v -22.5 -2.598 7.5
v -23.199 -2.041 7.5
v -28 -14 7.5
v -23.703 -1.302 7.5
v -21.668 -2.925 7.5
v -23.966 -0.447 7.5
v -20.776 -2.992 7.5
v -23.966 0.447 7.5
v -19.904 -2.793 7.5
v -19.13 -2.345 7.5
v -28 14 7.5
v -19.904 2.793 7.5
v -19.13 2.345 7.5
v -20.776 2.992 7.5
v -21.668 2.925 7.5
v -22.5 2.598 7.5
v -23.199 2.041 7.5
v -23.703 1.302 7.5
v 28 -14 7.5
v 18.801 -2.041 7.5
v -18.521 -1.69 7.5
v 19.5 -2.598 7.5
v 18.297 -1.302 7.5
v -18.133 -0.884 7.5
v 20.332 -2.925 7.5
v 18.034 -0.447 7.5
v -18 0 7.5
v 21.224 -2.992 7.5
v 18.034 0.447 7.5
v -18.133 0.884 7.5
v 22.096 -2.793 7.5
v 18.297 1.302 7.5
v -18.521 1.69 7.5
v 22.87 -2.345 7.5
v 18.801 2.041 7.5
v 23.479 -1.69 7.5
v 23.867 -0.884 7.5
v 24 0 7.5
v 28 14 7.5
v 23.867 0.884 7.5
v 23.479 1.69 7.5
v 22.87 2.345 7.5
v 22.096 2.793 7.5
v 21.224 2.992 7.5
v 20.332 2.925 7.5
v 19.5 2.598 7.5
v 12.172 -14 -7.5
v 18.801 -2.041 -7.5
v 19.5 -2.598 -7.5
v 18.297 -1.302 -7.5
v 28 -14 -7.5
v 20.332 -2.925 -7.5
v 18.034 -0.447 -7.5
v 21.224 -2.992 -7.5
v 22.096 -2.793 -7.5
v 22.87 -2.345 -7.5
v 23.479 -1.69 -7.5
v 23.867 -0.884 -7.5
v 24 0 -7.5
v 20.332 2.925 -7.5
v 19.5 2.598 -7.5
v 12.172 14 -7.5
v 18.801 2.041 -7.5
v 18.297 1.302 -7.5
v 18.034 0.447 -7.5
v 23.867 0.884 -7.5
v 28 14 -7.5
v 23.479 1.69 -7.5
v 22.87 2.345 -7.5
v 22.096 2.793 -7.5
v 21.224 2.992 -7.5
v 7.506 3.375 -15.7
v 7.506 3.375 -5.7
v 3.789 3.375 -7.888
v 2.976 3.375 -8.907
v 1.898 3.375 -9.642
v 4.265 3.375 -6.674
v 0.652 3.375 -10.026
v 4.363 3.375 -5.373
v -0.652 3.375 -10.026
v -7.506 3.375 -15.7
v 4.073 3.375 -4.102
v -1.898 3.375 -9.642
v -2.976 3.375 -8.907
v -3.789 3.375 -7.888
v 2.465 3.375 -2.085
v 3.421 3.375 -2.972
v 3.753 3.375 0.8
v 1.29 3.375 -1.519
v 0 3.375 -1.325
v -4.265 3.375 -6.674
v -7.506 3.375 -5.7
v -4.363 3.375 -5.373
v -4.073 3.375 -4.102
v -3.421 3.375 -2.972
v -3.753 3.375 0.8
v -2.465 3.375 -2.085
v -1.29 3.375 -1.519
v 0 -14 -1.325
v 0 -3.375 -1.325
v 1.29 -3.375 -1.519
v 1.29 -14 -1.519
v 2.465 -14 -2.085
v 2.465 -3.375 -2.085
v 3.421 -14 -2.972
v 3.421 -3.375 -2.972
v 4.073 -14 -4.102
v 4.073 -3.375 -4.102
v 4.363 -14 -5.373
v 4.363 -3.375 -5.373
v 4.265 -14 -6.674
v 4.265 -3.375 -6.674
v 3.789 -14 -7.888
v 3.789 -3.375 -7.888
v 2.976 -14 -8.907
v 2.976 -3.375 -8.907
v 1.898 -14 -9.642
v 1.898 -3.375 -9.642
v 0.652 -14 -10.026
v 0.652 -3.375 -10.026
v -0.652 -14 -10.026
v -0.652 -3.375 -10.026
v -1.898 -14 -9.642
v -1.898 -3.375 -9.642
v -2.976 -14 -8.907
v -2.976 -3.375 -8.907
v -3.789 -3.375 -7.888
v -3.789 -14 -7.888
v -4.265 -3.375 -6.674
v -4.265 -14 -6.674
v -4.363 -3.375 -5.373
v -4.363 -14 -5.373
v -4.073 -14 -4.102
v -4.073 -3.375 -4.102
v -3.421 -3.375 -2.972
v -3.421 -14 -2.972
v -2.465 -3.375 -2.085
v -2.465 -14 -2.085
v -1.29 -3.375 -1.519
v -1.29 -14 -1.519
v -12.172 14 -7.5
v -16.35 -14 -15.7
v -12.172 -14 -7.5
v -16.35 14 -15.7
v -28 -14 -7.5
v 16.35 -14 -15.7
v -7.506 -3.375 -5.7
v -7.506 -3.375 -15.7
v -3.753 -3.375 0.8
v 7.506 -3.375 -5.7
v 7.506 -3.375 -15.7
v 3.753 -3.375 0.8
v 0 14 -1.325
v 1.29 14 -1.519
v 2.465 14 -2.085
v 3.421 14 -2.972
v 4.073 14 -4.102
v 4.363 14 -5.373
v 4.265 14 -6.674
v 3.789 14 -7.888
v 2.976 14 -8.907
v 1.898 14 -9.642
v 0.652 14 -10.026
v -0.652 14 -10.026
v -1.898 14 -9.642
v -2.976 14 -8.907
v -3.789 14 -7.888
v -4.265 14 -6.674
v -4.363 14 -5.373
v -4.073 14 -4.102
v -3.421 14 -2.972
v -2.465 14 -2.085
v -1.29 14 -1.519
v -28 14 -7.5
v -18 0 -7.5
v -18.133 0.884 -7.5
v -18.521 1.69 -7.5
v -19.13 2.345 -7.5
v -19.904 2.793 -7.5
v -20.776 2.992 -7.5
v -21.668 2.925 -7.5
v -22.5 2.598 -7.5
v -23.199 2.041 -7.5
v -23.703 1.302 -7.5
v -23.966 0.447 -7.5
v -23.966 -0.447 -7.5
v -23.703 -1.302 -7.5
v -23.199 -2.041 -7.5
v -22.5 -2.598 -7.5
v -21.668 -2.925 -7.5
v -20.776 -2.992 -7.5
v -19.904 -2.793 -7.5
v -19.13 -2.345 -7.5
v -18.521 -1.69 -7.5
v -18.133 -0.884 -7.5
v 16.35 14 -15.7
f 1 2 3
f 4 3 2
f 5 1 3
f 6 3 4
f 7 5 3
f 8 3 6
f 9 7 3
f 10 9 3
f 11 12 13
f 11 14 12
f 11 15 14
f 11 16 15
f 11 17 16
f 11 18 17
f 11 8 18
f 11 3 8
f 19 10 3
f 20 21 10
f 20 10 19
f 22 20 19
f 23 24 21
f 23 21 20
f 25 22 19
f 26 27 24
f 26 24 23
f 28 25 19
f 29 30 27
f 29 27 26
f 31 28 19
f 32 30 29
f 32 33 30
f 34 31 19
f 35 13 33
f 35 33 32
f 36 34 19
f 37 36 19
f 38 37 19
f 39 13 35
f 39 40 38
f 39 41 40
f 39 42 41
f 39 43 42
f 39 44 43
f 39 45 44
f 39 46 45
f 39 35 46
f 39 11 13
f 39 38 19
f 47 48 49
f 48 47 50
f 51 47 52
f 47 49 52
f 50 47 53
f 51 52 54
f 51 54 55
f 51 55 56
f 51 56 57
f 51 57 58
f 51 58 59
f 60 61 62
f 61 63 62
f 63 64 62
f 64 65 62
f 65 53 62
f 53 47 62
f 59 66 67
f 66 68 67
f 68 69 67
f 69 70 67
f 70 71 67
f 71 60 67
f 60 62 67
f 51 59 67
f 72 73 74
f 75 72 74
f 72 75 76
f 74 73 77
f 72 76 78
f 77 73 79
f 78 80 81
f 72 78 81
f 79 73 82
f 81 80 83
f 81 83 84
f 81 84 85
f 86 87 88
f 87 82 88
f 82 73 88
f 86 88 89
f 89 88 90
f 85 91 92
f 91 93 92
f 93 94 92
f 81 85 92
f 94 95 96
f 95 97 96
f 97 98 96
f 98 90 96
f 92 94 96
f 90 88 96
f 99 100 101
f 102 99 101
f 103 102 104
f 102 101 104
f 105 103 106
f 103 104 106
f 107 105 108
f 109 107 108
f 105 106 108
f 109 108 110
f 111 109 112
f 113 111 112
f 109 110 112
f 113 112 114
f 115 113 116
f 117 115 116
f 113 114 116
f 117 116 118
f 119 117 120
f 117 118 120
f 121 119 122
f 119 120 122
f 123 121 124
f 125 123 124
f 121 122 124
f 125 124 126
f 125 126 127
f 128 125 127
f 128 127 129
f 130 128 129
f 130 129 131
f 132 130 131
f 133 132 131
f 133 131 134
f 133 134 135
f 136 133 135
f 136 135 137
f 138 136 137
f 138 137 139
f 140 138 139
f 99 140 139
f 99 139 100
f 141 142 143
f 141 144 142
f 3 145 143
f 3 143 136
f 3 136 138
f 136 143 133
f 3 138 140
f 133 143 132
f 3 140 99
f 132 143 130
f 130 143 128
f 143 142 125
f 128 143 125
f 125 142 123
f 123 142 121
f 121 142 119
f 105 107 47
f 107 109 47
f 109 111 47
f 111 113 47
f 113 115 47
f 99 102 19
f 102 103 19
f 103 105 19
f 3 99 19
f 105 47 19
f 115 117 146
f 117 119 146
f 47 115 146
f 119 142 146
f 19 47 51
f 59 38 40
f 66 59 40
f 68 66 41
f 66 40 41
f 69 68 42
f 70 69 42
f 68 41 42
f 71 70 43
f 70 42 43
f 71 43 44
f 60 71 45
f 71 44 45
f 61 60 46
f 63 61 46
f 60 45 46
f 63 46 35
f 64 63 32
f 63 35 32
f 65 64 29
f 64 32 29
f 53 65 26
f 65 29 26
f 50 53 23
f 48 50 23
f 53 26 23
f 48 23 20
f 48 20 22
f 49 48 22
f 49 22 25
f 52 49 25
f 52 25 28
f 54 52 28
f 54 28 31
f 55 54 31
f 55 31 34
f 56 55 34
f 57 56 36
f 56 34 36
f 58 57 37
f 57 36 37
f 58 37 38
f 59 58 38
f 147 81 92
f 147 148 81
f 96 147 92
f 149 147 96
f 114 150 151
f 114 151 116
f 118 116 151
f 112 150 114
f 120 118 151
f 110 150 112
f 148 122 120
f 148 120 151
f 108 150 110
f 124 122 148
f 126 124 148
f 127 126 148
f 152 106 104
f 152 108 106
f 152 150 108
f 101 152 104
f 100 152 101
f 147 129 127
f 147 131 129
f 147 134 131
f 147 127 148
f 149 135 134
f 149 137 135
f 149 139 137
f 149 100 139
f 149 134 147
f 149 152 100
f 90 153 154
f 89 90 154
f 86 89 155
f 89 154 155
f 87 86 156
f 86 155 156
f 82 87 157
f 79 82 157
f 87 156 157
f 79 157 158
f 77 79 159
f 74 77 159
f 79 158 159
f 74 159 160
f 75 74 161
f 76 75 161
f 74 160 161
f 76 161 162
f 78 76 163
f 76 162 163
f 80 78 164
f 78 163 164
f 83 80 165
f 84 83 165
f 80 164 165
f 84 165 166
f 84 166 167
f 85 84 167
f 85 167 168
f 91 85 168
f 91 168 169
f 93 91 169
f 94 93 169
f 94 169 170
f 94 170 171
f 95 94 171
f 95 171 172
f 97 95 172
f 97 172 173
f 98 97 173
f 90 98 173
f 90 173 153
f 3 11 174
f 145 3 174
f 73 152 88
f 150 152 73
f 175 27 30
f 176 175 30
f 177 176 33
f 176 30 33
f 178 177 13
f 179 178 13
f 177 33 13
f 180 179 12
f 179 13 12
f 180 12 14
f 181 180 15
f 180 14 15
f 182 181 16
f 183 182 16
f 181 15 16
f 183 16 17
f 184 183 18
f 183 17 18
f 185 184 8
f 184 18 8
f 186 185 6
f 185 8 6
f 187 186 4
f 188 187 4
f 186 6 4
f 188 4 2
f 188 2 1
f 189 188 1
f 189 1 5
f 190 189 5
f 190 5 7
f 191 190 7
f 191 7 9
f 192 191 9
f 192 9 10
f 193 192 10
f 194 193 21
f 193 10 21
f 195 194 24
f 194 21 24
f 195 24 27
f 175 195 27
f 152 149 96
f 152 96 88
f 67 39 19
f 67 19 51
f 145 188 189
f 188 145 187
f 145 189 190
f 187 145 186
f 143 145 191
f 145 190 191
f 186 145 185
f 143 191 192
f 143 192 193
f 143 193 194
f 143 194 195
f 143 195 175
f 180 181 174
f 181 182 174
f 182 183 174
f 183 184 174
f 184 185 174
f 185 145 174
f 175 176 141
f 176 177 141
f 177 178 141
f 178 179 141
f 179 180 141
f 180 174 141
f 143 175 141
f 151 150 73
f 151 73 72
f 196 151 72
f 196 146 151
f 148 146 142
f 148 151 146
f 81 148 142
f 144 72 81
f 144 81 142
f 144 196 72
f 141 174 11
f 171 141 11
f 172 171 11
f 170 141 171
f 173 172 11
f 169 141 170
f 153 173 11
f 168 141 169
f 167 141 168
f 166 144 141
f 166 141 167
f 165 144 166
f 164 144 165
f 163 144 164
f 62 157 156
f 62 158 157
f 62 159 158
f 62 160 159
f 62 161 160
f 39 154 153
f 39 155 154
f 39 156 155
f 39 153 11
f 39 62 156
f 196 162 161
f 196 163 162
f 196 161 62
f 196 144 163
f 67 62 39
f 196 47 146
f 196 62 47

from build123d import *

# Parameters (mm, degrees)
SKETCH1_W           = 56
SKETCH1_H           = 15
BOSS_EXTRUDE1_DEPTH = 14
SKETCH2_R           = 4.375
CUT_EXTRUDE1_DEPTH  = 28
SKETCH4_R           = 3
CUT_EXTRUDE3_DEPTH  = 15
CUT_EXTRUDE4_DEPTH  = 3.375


with BuildPart() as part:
    # Sketch1 → Boss-Extrude1 (new, symmetric)
    with BuildSketch(Plane(origin=(0, 0, 0), x_dir=(1, 0, 0), z_dir=(0, 1, 0))):
        Polygon((-16.35, 15.7), (-12.171891314, 7.5), (12.171891314, 7.5), (16.35, 15.7), align=None)
        Rectangle(SKETCH1_W, SKETCH1_H)
    extrude(amount=BOSS_EXTRUDE1_DEPTH, both=True)

    # Sketch2 → Cut-Extrude1 (cut)
    with BuildSketch(Plane(origin=(0, 14, 0), x_dir=(1, 0, 0), z_dir=(0, 1, 0))):
        with Locations(Location((0, 5.7, 0), (0, 0, 270))):
            Circle(SKETCH2_R)
    extrude(amount=-CUT_EXTRUDE1_DEPTH, mode=Mode.SUBTRACT)

    # Sketch4 → Cut-Extrude3 (cut)
    with BuildSketch(Plane.XY.offset(7.5)):
        with Locations((-21, 0)):
            Circle(SKETCH4_R)
        with Locations((21, 0)):
            Circle(SKETCH4_R)
    extrude(amount=-CUT_EXTRUDE3_DEPTH, mode=Mode.SUBTRACT)

    # Sketch3 → Cut-Extrude4 (cut, symmetric)
    with BuildSketch(Plane.XZ):
        Polygon((7.505553499, -5.7), (7.505553499, -15.7), (-7.505553499, -15.7), (-7.505553499, -5.7), (-3.75277675, 0.8), (3.75277675, 0.8), align=None)
    extrude(amount=CUT_EXTRUDE4_DEPTH, both=True, mode=Mode.SUBTRACT)


solid = part.part
